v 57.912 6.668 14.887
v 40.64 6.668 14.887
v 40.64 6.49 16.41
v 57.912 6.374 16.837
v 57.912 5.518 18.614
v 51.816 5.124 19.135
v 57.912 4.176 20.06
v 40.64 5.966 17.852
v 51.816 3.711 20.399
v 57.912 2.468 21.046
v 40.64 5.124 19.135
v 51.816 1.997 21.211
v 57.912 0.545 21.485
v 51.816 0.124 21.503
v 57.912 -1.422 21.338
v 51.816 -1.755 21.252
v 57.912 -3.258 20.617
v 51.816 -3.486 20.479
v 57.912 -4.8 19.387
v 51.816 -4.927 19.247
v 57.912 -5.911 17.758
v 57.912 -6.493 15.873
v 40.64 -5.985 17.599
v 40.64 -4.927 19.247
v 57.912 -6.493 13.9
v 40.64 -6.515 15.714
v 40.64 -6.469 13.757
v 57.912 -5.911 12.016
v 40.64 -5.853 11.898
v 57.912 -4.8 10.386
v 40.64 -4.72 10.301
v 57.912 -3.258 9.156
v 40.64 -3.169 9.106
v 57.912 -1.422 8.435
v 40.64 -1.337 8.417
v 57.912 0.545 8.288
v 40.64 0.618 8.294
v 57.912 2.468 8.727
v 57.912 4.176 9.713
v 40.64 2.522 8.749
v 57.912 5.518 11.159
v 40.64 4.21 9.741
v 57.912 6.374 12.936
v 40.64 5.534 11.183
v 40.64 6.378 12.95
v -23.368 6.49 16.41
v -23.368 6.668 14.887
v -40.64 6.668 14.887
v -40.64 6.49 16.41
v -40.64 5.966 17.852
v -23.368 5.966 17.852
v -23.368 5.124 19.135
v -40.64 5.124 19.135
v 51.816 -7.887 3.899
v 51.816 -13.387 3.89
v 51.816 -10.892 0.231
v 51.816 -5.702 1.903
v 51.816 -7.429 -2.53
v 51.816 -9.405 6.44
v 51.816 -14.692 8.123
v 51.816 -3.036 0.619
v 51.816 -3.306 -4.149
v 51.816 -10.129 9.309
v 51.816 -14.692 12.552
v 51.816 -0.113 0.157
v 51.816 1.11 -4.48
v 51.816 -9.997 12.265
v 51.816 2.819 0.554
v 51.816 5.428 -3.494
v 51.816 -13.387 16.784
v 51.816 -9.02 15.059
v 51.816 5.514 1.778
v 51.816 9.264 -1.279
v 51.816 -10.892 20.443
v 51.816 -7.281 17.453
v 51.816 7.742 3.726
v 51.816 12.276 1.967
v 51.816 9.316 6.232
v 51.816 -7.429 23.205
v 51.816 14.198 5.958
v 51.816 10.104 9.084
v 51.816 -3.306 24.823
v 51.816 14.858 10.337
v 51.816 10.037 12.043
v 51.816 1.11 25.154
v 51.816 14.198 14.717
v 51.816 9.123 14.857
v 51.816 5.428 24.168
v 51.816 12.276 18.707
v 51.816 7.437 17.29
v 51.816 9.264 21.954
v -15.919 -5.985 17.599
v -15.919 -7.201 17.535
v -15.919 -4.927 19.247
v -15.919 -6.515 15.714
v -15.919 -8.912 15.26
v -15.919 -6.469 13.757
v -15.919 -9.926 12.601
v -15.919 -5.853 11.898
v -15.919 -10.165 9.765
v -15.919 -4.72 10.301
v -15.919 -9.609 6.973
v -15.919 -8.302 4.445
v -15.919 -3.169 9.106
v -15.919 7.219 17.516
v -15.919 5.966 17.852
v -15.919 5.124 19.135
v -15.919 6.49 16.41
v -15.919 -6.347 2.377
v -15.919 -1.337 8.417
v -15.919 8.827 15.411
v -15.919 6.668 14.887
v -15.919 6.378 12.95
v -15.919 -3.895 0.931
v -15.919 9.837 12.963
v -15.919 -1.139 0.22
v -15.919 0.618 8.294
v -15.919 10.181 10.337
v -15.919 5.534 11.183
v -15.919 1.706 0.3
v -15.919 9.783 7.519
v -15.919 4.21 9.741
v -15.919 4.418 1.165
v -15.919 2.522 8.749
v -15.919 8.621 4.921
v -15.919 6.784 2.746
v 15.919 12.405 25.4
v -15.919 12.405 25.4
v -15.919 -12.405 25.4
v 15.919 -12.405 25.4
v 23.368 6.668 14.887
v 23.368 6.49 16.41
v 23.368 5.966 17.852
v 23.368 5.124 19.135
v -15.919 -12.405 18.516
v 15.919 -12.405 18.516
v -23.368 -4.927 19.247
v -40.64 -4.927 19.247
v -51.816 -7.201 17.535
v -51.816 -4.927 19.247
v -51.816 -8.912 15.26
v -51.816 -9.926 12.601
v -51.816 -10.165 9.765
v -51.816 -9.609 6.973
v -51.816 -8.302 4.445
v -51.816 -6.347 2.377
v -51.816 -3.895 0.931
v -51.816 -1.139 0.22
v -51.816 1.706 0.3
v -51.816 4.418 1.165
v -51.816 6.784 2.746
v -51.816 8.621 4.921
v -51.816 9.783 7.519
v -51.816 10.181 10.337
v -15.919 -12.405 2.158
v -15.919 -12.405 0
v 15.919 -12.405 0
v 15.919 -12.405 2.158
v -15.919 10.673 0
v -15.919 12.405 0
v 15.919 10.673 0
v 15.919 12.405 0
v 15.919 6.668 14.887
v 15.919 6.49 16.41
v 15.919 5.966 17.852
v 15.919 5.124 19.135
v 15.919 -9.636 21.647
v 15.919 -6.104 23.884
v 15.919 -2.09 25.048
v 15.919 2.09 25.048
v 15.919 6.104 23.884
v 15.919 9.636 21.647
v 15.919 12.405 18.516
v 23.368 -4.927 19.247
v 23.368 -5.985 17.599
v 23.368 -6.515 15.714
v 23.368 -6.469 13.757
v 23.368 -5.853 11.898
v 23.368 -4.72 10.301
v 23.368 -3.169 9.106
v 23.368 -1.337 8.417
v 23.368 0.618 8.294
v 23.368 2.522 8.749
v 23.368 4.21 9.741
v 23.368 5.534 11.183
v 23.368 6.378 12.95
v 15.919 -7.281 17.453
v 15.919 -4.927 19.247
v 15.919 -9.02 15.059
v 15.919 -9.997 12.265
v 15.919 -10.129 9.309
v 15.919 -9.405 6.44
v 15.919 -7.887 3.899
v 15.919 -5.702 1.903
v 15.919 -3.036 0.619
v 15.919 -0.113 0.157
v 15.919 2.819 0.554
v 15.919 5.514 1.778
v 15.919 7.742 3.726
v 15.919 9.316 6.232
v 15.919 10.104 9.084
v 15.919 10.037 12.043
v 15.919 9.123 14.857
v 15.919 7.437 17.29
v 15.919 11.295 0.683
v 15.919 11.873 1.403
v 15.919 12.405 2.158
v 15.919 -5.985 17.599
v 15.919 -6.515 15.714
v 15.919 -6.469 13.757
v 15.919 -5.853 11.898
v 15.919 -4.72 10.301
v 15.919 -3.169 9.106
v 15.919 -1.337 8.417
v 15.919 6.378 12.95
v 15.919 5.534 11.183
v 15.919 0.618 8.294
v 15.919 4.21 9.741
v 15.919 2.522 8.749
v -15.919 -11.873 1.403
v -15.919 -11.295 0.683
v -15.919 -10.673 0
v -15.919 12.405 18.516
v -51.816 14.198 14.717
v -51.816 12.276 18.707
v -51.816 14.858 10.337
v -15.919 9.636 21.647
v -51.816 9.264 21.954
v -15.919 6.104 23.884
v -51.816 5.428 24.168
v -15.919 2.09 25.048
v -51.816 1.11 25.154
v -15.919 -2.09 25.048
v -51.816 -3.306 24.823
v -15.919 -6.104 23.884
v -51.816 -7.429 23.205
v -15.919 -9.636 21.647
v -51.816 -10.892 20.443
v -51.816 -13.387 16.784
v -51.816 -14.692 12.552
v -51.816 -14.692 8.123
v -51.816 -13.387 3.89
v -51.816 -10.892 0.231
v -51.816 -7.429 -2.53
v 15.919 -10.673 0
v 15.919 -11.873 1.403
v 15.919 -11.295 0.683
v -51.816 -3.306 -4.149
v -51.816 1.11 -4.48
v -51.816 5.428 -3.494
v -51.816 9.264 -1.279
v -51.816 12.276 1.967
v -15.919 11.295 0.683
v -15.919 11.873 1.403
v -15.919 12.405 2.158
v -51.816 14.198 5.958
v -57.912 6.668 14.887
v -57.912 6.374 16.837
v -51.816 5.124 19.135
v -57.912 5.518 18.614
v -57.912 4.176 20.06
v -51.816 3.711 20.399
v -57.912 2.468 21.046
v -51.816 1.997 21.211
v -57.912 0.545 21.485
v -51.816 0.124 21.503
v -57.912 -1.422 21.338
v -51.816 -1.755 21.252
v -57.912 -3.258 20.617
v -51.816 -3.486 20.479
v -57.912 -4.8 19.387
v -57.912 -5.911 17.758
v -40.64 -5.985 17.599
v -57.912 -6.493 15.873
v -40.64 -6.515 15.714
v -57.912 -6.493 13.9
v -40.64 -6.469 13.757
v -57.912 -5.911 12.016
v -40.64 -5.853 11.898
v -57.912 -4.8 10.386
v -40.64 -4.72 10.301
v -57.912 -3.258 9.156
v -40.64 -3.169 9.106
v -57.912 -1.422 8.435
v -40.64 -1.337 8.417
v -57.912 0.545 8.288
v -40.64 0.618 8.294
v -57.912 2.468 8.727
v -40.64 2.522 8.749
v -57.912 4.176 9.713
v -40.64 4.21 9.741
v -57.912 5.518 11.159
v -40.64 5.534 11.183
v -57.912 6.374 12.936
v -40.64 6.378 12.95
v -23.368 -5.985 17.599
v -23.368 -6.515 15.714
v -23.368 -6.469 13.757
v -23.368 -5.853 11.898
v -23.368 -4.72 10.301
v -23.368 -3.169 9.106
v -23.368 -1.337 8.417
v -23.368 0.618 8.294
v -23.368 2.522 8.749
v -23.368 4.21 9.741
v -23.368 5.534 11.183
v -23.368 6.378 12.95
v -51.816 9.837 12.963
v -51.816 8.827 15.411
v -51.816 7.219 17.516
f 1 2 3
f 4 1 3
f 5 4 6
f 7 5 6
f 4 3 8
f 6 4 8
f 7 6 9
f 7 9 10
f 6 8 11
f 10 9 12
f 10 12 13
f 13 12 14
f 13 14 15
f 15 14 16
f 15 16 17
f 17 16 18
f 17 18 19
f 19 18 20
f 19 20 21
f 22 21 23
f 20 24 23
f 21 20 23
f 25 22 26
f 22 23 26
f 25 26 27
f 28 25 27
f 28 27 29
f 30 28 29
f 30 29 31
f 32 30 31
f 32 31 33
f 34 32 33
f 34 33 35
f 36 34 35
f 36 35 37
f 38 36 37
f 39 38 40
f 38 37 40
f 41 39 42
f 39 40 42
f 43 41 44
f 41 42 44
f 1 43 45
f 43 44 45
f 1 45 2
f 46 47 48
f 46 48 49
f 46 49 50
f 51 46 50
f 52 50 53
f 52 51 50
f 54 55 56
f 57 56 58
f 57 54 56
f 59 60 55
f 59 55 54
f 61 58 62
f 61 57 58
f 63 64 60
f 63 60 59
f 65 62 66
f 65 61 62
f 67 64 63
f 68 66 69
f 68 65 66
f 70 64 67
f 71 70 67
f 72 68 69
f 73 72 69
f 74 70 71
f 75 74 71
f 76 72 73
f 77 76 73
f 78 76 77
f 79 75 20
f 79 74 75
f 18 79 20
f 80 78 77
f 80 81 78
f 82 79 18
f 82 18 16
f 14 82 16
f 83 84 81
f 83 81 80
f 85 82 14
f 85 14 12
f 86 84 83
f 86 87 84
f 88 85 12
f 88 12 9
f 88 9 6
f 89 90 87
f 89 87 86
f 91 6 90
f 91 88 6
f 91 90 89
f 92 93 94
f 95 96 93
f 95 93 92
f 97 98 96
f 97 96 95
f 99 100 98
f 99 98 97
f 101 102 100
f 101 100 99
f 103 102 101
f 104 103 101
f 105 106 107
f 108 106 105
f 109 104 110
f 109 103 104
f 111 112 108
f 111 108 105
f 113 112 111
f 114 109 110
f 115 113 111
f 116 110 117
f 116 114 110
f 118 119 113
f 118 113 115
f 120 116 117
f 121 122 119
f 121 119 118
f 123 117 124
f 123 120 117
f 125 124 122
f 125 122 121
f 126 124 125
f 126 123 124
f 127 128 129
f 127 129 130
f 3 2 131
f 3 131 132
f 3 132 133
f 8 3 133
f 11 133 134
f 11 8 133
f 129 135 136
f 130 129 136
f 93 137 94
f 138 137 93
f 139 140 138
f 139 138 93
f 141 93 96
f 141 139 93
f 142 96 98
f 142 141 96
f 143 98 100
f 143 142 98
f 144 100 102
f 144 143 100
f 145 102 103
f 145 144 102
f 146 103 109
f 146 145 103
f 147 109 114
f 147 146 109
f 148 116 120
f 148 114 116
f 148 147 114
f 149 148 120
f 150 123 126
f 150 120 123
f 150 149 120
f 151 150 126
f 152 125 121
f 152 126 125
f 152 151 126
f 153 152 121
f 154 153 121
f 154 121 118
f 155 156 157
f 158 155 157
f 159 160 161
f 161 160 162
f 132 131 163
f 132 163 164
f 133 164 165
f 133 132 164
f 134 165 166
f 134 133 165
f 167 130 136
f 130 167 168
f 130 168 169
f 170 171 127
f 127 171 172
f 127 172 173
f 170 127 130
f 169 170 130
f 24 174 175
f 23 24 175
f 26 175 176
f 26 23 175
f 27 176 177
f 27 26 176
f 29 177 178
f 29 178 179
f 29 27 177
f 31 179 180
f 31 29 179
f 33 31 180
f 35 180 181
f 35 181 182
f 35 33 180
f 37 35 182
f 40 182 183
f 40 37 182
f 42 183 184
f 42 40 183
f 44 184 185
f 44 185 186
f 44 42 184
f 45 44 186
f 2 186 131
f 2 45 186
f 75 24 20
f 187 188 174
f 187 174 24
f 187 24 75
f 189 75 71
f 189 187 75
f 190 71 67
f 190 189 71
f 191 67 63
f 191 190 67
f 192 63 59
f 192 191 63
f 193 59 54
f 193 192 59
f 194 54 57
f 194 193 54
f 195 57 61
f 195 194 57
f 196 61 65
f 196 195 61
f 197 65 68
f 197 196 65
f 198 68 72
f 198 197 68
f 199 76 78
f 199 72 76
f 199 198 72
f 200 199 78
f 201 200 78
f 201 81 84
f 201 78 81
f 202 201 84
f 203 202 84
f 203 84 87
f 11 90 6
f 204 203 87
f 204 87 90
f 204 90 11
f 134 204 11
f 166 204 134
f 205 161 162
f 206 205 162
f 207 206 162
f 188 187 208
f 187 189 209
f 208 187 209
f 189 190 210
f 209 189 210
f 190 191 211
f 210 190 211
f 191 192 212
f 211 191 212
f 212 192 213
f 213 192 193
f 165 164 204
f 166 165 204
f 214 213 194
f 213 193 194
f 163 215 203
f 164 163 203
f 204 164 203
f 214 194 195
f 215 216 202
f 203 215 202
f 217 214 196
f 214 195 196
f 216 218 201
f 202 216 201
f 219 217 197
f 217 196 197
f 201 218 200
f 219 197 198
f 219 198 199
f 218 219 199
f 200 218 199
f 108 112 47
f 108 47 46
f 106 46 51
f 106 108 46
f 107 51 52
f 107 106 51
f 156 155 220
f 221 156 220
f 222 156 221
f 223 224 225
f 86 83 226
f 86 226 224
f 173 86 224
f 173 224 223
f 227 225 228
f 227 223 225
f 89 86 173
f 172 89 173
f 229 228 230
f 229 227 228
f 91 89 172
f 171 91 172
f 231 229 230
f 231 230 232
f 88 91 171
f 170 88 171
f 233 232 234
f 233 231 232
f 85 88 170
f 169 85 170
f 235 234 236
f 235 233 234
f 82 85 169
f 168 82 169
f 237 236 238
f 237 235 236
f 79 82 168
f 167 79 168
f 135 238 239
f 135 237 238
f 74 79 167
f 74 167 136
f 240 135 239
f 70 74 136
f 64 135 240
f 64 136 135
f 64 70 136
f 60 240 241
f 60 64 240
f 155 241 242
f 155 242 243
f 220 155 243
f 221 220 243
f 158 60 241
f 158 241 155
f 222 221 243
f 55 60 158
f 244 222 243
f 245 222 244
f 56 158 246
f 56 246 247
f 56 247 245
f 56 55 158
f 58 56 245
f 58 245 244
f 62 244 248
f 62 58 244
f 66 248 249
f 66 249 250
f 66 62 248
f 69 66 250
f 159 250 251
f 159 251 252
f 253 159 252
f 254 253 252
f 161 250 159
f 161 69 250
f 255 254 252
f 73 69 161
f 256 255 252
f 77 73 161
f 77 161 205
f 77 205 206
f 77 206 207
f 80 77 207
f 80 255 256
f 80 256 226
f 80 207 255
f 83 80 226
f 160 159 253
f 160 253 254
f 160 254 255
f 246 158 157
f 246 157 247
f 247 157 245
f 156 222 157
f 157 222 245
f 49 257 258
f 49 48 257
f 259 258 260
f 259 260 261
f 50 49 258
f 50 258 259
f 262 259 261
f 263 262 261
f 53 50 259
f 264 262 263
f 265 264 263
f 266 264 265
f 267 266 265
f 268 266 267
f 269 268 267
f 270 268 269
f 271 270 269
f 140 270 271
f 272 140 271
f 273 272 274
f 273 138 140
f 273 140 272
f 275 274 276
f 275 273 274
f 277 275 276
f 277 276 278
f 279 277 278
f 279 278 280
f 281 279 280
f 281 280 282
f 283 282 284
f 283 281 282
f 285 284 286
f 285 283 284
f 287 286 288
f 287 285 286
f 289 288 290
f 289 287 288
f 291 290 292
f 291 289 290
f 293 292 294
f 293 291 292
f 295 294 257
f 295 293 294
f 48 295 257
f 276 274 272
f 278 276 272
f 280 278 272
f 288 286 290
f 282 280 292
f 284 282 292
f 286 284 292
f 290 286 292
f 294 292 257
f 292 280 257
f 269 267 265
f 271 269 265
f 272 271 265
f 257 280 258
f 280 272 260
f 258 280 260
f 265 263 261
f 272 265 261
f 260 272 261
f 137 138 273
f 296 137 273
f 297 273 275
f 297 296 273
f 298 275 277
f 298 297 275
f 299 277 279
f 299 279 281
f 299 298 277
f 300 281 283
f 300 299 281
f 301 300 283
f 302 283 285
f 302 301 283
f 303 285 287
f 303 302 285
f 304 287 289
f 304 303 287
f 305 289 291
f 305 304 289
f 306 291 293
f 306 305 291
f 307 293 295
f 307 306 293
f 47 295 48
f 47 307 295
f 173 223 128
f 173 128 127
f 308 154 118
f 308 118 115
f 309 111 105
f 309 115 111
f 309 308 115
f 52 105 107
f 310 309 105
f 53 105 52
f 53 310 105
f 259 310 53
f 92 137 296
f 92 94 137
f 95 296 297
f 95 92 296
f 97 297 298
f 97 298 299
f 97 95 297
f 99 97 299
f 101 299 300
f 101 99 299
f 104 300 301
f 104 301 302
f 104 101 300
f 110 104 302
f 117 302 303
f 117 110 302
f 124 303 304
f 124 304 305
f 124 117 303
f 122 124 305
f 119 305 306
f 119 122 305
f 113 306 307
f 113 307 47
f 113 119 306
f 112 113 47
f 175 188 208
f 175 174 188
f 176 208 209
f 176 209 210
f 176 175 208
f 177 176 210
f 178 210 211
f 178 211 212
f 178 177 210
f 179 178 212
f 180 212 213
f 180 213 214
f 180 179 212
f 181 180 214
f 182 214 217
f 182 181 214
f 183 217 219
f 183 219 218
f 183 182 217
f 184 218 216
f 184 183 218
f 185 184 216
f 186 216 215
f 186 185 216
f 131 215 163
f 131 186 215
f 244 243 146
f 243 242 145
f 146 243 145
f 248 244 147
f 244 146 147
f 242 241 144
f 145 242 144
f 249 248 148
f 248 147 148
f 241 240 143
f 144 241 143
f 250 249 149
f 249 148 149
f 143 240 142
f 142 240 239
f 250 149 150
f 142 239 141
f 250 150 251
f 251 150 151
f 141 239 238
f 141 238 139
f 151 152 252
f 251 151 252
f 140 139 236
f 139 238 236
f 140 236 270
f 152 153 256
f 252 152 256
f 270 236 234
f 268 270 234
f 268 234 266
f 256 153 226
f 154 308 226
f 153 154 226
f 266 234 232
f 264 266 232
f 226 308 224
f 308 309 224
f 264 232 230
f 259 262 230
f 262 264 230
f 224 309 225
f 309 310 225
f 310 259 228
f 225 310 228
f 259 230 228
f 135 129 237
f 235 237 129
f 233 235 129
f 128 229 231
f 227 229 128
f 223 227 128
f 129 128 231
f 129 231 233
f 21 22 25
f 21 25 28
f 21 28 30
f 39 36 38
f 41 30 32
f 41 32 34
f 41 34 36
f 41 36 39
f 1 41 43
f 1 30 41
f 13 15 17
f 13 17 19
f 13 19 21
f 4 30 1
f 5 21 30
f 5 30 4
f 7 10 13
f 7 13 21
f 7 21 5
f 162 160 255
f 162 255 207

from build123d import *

# Parameters (mm, degrees)
F0_W     = 31.838607043
F0_H     = 24.8093027622
F1_DEPTH = 25.4
F2_R     = 6.6170085052
F3_DEPTH = 40.64
F4_DEPTH = 17.272
F5_R     = 14.8582779771
F5_R_2   = 10.1809706262
F6_DEPTH = 51.816


with BuildPart() as f1:
    # F0 (on Top) → F1 (new body)
    with BuildSketch(Plane.XY):
        Rectangle(F0_W, F0_H)
    extrude(amount=F1_DEPTH)

    # F2 (on Right) → F3 (join, symmetric)
    with BuildSketch(Plane.YZ):
        with Locations((0.0505595074, 14.8865826207)):
            Circle(F2_R)
    extrude(amount=F3_DEPTH, both=True)

    # F4 (add, symmetric): faces of the model
    f4_faces = [f1.faces().sort_by_distance(p)[0] for p in [
        (-40.64, 0.0505595074, 14.8865826207),
        (40.64, 0.0505595074, 14.8865826207),
    ]]
    extrude(f4_faces, amount=F4_DEPTH, both=True, dir=(-1, 0, 0))

    # F5 (on Right) → F6 (join, symmetric)
    with BuildSketch(Plane.YZ):
        with Locations((0, 10.337209329)):
            Circle(F5_R)
        with Locations((0, 10.337209329)):
            Circle(F5_R_2, mode=Mode.SUBTRACT)
    extrude(amount=F6_DEPTH, both=True)


solid = f1.part
